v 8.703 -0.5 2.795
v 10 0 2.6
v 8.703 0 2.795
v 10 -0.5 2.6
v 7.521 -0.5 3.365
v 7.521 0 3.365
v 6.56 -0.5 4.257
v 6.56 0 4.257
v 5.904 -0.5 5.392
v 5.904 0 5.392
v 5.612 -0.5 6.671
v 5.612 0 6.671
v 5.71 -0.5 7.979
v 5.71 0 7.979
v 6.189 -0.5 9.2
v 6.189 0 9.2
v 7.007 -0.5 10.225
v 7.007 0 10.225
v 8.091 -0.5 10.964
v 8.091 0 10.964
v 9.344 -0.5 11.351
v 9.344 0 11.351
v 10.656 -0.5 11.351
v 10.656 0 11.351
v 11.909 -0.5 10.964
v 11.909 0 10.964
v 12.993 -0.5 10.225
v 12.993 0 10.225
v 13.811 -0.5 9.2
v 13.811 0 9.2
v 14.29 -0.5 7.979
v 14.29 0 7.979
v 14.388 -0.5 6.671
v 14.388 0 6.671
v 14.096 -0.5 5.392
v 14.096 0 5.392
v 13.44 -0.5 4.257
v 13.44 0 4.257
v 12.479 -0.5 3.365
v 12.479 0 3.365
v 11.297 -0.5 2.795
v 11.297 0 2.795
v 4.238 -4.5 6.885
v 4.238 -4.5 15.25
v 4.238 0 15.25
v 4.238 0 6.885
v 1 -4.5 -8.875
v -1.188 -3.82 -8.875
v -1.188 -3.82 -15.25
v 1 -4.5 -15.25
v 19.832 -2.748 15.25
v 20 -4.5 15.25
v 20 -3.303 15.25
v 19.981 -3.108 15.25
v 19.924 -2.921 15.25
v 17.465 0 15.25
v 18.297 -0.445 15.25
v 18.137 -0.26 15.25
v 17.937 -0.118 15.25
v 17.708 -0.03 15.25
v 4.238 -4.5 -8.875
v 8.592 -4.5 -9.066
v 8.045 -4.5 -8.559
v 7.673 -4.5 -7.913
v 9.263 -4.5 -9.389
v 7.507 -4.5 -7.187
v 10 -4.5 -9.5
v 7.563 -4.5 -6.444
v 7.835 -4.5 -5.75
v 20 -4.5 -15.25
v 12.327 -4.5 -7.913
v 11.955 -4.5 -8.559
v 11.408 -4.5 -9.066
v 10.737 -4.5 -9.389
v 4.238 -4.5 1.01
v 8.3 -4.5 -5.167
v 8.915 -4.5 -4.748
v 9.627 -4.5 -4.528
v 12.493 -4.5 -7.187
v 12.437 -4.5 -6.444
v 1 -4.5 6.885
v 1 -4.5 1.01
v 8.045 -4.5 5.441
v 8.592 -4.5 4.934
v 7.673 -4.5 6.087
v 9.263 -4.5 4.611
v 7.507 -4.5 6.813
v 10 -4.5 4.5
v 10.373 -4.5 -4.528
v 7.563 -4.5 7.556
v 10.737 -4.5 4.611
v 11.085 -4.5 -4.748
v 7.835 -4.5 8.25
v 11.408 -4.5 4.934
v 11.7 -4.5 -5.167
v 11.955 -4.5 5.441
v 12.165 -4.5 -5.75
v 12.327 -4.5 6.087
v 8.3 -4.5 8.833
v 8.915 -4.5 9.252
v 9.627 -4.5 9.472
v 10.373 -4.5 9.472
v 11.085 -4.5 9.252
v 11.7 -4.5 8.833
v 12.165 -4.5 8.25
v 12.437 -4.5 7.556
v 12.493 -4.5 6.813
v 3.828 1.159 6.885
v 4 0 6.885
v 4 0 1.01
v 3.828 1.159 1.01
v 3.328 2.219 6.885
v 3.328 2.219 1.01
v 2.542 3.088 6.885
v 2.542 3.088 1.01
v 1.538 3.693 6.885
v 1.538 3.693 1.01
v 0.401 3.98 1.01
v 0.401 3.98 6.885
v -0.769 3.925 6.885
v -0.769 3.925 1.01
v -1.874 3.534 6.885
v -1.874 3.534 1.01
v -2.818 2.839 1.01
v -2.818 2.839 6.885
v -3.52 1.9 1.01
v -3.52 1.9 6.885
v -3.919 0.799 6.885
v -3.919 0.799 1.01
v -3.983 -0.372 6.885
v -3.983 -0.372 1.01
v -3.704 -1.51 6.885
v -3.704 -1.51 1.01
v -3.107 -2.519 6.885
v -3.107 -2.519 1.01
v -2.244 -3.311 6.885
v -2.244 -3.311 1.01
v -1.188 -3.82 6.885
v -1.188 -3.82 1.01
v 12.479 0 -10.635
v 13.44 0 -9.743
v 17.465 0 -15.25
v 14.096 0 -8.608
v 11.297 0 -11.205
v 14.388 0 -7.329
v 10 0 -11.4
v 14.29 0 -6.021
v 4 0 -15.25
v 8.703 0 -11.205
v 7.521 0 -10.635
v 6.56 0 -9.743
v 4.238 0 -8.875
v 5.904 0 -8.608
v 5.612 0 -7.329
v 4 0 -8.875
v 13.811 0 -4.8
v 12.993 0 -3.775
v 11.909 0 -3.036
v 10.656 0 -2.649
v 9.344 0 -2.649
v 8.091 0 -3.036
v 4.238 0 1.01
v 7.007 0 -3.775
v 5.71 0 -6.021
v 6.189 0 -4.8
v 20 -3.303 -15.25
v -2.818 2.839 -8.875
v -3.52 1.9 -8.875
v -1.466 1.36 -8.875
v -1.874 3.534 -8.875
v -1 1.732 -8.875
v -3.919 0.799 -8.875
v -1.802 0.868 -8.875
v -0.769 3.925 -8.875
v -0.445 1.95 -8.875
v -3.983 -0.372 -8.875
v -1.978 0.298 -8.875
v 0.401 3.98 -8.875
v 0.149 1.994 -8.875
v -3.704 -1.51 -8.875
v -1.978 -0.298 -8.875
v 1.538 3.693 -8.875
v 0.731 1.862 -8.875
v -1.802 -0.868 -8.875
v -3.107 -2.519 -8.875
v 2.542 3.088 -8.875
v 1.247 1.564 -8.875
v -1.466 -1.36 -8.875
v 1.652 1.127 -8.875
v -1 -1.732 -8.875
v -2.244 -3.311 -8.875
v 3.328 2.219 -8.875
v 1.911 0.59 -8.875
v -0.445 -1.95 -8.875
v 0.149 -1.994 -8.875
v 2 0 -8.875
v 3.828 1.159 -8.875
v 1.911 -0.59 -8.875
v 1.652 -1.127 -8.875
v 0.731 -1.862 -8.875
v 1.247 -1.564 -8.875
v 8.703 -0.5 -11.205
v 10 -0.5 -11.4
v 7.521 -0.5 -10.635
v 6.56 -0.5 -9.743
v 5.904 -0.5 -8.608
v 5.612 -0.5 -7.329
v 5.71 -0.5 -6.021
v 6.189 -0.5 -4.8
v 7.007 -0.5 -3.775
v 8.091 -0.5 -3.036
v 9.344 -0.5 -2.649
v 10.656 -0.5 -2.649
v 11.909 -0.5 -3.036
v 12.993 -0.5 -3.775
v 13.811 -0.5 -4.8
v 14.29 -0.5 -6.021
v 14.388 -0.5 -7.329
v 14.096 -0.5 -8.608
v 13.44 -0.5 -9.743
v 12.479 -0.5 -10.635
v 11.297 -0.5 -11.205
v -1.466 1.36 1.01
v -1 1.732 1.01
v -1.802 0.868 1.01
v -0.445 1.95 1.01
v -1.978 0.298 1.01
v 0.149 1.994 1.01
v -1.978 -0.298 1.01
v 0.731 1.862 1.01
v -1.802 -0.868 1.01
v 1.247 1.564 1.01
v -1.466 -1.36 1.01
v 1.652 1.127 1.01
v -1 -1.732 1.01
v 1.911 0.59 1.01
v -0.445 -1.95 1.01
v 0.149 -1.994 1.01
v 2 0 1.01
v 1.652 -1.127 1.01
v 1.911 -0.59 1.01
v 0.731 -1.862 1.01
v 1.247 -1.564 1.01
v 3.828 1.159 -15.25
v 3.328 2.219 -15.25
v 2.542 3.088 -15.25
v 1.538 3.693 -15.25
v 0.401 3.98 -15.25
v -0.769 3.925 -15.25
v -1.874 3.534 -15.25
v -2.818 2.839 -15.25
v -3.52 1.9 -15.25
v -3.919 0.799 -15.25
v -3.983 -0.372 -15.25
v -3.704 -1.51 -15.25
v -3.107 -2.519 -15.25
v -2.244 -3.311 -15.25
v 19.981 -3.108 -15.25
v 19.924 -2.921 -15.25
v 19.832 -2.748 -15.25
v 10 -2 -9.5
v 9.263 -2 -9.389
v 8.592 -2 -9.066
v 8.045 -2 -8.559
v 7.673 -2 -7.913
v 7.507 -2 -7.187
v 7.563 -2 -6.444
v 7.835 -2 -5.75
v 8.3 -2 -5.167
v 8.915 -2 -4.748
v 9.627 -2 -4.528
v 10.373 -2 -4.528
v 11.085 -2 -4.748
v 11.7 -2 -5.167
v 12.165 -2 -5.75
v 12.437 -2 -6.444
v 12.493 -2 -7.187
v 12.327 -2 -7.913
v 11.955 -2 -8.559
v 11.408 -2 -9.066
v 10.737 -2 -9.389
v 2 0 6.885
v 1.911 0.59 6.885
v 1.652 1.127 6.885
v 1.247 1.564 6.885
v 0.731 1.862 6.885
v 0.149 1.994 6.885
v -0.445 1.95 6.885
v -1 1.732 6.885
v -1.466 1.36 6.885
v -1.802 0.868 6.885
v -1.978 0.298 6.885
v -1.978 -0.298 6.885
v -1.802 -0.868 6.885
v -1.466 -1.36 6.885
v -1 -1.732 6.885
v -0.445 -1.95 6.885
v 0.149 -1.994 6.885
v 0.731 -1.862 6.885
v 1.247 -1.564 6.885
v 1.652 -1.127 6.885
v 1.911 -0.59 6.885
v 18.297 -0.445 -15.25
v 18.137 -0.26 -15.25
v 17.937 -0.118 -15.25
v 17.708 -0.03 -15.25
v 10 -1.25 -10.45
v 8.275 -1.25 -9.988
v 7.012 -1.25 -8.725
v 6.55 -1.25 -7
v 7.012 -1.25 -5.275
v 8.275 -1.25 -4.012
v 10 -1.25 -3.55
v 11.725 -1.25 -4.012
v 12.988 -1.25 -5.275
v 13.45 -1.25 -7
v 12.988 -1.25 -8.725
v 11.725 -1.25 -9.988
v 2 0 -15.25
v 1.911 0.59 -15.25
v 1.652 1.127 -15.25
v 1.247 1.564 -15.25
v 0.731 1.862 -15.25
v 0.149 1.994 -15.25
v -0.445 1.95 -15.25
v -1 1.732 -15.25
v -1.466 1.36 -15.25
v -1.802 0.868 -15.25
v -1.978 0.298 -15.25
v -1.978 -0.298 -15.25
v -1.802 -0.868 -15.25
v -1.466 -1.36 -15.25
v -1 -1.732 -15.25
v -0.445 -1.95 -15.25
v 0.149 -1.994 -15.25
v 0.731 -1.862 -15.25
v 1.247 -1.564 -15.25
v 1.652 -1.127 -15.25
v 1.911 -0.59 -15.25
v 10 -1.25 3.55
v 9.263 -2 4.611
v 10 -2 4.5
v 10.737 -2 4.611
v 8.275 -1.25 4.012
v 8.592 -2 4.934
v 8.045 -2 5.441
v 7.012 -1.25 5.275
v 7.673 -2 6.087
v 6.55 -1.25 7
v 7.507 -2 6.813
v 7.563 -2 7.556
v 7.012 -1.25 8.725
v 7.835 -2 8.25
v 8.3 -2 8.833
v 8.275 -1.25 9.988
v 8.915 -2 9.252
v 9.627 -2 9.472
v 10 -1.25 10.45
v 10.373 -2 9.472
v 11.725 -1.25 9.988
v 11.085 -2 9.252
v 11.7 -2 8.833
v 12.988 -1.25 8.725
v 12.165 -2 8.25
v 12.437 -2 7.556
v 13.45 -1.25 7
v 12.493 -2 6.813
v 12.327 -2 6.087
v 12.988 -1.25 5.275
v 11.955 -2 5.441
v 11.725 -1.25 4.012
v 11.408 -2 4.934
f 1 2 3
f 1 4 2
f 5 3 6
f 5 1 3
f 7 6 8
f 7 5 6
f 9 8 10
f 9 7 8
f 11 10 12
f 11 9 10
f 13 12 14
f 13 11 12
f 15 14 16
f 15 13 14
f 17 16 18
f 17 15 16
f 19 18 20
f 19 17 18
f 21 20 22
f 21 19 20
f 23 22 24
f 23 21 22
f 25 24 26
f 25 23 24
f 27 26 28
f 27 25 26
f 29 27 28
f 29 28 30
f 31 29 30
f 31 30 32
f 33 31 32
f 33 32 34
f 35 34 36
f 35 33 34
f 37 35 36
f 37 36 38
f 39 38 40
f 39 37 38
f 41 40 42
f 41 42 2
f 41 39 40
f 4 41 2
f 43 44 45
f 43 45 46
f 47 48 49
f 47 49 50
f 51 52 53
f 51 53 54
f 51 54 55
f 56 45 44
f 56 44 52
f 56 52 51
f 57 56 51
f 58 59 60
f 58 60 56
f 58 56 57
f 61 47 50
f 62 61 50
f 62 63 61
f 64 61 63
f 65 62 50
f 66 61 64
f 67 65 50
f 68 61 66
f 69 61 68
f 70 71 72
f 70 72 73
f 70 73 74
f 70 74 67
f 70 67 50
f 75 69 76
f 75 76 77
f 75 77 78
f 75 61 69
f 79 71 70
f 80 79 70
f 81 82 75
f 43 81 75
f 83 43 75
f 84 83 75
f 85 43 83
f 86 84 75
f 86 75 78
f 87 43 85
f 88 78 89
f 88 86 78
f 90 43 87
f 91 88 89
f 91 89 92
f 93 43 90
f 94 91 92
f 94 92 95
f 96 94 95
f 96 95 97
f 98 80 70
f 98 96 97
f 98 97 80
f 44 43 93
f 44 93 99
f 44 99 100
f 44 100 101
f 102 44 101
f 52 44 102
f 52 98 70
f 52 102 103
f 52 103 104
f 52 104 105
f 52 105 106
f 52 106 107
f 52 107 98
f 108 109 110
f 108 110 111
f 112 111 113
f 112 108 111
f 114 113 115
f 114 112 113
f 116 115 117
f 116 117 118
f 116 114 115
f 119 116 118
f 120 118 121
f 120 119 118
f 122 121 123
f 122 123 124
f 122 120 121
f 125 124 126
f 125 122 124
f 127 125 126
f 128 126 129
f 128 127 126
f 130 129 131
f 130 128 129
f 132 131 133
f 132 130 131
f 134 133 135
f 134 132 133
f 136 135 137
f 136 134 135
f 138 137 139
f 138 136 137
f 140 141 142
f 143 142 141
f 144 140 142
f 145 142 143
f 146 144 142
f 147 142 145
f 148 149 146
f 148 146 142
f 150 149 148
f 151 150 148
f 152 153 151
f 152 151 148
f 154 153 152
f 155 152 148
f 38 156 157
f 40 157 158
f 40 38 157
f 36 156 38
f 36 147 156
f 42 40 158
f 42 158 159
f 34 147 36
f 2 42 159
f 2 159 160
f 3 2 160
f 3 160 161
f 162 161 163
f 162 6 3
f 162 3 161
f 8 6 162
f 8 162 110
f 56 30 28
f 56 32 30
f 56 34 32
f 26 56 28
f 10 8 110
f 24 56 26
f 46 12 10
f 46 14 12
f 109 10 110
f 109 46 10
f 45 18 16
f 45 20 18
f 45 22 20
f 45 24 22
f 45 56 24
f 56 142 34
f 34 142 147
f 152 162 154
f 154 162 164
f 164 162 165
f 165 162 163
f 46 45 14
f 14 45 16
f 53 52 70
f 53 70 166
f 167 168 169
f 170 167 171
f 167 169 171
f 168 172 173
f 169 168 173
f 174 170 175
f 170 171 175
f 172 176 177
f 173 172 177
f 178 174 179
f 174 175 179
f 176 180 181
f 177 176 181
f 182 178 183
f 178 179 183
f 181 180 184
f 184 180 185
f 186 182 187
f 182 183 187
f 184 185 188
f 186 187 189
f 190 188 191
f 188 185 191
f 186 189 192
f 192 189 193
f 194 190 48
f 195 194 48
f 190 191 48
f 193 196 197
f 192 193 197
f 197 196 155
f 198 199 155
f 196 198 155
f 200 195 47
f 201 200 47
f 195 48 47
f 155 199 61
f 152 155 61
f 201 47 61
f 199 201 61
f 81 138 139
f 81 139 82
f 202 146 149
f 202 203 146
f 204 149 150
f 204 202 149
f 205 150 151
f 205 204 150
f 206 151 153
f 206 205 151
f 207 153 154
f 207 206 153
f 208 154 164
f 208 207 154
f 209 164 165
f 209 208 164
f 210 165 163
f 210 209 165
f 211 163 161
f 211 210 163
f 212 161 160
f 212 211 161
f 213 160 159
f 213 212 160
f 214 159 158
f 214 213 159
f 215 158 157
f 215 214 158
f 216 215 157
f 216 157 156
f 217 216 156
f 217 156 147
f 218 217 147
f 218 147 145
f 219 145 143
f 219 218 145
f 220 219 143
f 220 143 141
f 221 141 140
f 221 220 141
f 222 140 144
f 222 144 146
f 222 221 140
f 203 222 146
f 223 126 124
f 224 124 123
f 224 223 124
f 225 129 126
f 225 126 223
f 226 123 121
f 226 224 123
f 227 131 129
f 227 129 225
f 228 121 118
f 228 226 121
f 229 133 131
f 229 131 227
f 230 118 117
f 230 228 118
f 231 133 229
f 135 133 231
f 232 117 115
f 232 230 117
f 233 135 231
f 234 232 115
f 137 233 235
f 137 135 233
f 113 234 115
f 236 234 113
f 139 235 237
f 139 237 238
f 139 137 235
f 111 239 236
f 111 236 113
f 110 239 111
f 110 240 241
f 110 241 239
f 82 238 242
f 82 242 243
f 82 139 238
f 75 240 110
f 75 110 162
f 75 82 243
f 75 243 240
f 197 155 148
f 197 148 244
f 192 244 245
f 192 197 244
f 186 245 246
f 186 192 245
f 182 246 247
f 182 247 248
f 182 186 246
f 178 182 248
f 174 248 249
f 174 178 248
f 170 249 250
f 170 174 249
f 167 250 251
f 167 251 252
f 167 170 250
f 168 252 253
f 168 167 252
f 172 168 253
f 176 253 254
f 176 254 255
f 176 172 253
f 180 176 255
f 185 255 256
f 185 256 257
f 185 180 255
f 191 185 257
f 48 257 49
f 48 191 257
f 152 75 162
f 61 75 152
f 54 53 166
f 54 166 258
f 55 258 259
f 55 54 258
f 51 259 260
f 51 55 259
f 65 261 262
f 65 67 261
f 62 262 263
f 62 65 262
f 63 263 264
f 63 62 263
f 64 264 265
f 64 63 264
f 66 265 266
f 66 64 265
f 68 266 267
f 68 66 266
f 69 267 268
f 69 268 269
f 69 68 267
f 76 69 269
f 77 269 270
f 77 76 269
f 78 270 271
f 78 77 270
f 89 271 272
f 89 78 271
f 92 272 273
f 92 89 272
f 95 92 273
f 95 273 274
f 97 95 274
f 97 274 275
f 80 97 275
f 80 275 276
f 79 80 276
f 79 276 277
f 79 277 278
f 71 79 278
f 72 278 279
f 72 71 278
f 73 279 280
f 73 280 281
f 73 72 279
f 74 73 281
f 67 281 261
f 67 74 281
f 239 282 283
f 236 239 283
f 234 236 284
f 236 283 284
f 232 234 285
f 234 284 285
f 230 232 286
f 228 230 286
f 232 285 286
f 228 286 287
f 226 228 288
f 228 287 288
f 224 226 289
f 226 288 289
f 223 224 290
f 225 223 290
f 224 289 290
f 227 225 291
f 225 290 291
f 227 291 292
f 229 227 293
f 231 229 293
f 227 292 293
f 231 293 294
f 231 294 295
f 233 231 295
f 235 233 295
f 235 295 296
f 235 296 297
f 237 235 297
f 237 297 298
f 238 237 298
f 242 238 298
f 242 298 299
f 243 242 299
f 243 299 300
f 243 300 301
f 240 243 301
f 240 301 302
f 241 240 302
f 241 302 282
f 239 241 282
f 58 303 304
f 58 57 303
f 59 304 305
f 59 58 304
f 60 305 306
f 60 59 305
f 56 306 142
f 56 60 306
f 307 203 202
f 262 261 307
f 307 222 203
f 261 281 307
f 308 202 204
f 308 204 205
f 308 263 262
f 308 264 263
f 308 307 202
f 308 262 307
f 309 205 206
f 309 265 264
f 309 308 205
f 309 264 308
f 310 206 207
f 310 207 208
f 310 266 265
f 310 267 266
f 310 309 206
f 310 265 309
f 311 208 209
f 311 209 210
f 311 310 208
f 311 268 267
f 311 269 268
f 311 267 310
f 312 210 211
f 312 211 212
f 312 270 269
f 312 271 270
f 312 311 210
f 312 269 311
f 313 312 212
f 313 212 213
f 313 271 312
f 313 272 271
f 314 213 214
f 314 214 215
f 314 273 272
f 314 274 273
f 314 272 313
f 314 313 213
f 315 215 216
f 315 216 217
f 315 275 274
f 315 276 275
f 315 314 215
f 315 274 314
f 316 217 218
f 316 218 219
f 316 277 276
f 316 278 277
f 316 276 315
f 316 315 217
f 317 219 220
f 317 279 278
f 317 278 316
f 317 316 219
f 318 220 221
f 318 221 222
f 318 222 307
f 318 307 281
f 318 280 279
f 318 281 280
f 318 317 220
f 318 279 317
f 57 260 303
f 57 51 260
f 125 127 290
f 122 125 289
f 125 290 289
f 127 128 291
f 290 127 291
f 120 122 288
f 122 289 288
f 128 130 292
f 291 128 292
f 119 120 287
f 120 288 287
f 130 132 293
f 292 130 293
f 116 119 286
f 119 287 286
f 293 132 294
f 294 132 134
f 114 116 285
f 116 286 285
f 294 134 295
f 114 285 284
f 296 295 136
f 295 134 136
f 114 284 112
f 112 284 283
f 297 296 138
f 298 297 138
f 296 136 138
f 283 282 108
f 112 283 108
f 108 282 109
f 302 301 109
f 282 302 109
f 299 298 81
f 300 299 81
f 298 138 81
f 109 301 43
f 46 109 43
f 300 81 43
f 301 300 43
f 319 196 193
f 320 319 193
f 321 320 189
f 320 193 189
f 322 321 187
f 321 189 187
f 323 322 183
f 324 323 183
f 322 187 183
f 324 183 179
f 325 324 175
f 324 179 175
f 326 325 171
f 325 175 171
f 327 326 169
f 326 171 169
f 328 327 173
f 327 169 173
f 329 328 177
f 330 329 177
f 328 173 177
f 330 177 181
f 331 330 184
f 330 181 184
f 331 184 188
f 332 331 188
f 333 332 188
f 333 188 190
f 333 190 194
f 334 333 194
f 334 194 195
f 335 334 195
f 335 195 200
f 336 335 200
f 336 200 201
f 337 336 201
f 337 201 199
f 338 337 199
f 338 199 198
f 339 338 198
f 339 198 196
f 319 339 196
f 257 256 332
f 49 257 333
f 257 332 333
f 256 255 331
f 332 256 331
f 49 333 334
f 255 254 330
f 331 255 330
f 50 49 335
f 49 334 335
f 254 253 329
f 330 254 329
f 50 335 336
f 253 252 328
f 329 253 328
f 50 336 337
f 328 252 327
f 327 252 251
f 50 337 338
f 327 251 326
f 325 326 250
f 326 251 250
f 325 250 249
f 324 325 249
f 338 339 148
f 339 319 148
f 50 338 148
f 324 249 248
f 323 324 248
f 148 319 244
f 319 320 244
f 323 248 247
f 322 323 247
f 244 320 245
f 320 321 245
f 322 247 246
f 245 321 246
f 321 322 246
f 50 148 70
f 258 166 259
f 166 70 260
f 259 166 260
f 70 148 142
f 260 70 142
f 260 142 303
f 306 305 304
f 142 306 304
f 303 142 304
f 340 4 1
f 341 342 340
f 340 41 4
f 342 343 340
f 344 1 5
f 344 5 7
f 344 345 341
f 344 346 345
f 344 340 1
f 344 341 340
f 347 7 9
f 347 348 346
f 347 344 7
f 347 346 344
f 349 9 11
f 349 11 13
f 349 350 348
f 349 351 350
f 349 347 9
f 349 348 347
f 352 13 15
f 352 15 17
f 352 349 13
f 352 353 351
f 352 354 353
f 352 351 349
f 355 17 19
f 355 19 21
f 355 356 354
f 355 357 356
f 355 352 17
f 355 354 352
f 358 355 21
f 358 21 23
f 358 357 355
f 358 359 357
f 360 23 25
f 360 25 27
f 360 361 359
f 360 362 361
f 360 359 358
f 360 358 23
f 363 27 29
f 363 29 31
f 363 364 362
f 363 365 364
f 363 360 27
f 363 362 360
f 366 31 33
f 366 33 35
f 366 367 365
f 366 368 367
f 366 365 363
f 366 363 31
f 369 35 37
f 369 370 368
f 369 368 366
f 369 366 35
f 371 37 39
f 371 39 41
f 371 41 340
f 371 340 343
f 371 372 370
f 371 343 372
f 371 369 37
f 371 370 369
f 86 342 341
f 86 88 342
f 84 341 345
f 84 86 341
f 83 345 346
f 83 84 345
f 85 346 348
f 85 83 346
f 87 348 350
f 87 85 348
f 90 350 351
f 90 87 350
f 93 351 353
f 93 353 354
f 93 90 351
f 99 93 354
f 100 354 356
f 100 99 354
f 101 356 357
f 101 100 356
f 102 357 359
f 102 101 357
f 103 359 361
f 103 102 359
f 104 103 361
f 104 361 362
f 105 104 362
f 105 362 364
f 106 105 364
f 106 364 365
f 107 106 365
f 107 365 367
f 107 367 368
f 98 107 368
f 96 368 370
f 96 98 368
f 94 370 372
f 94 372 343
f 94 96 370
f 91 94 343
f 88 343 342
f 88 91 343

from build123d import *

# Parameters (mm, degrees)
EXTRUDE_1_DEPTH          = 15.25
CUT_EXTRUDE_1_DEPTH      = 26.550195694
CUT_EXTRUDE_1_DEPTH_BACK = 26.550195694
SKETCH_3_W               = 8.238165393
SKETCH_3_H               = 8.365
SKETCH_3_H_2             = 9.885
SKETCH_4_R               = 2
CUT_EXTRUDE_2_DEPTH      = 31.169657356
PATTERN_LINEAR_1_COUNT   = 2
PATTERN_LINEAR_1_PITCH   = 14


with BuildPart() as part:
    # 草图1 → 凸台-拉伸1 (new, symmetric)
    with BuildSketch(Plane.XY):
        with BuildLine():
            Line((17.464816242, 0), (4, 0))
            ThreePointArc((4, 0), (-2.371533507, 3.221153338), (-1.187914412, -3.819536536))
            Line((-1.187914412, -3.819536536), (1, -4.5))
            Line((1, -4.5), (20, -4.5))
            Line((20, -4.5), (20, -3.302775638))
            ThreePointArc((20, -3.302775638), (19.957092026, -3.012991489), (19.832050294, -2.748075442))
            Line((19.832050294, -2.748075442), (18.296866536, -0.445299804))
            ThreePointArc((18.296866536, -0.445299804), (17.936674167, -0.118325401), (17.464816242, 0))
        make_face()
    extrude(amount=EXTRUDE_1_DEPTH, both=True)

    # 草图3 → 切除-拉伸1 (cut, two sides: drawn at the far end of the back side and taken through both)
    with BuildSketch(Plane(origin=(0, 0, 0), x_dir=(1, 0, 0), z_dir=(0, 1, 0)).offset(-CUT_EXTRUDE_1_DEPTH_BACK)):
        with Locations((0.119082697, -11.0675)):
            Rectangle(SKETCH_3_W, SKETCH_3_H)
        with Locations((0.119082697, 3.9325)):
            Rectangle(SKETCH_3_W, SKETCH_3_H_2)
    extrude(amount=CUT_EXTRUDE_1_DEPTH + CUT_EXTRUDE_1_DEPTH_BACK, mode=Mode.SUBTRACT)

    # 草图4 → 切除-拉伸2 (cut, through all)
    with BuildSketch(Plane.XY.offset(6.885)):
        Circle(SKETCH_4_R)
    extrude(amount=-CUT_EXTRUDE_2_DEPTH, mode=Mode.SUBTRACT)

    # 草图5 → 切除-旋转1 (revolve, cut)
    with BuildSketch(Plane.XY.offset(7), mode=Mode.PRIVATE) as cut_revolve_1_sk:
        Polygon((10, -4.5), (10, 0), (14.4, 0), (14.4, -0.5), (12.5, -2), (12.5, -4.5), align=None)
    cut_revolve_1 = revolve(cut_revolve_1_sk.sketch.rotate(Axis((10, -4.5, 7), (0, 1, 0)), 90), axis=Axis((10, -4.5, 7), (0, 1, 0)), mode=Mode.SUBTRACT)

    # 阵列(线性)1: 切除-旋转1 ×2
    with Locations(*[(0, 0, -i * PATTERN_LINEAR_1_PITCH) for i in range(1, PATTERN_LINEAR_1_COUNT)]):
        add(cut_revolve_1, mode=Mode.SUBTRACT)


solid = part.part
